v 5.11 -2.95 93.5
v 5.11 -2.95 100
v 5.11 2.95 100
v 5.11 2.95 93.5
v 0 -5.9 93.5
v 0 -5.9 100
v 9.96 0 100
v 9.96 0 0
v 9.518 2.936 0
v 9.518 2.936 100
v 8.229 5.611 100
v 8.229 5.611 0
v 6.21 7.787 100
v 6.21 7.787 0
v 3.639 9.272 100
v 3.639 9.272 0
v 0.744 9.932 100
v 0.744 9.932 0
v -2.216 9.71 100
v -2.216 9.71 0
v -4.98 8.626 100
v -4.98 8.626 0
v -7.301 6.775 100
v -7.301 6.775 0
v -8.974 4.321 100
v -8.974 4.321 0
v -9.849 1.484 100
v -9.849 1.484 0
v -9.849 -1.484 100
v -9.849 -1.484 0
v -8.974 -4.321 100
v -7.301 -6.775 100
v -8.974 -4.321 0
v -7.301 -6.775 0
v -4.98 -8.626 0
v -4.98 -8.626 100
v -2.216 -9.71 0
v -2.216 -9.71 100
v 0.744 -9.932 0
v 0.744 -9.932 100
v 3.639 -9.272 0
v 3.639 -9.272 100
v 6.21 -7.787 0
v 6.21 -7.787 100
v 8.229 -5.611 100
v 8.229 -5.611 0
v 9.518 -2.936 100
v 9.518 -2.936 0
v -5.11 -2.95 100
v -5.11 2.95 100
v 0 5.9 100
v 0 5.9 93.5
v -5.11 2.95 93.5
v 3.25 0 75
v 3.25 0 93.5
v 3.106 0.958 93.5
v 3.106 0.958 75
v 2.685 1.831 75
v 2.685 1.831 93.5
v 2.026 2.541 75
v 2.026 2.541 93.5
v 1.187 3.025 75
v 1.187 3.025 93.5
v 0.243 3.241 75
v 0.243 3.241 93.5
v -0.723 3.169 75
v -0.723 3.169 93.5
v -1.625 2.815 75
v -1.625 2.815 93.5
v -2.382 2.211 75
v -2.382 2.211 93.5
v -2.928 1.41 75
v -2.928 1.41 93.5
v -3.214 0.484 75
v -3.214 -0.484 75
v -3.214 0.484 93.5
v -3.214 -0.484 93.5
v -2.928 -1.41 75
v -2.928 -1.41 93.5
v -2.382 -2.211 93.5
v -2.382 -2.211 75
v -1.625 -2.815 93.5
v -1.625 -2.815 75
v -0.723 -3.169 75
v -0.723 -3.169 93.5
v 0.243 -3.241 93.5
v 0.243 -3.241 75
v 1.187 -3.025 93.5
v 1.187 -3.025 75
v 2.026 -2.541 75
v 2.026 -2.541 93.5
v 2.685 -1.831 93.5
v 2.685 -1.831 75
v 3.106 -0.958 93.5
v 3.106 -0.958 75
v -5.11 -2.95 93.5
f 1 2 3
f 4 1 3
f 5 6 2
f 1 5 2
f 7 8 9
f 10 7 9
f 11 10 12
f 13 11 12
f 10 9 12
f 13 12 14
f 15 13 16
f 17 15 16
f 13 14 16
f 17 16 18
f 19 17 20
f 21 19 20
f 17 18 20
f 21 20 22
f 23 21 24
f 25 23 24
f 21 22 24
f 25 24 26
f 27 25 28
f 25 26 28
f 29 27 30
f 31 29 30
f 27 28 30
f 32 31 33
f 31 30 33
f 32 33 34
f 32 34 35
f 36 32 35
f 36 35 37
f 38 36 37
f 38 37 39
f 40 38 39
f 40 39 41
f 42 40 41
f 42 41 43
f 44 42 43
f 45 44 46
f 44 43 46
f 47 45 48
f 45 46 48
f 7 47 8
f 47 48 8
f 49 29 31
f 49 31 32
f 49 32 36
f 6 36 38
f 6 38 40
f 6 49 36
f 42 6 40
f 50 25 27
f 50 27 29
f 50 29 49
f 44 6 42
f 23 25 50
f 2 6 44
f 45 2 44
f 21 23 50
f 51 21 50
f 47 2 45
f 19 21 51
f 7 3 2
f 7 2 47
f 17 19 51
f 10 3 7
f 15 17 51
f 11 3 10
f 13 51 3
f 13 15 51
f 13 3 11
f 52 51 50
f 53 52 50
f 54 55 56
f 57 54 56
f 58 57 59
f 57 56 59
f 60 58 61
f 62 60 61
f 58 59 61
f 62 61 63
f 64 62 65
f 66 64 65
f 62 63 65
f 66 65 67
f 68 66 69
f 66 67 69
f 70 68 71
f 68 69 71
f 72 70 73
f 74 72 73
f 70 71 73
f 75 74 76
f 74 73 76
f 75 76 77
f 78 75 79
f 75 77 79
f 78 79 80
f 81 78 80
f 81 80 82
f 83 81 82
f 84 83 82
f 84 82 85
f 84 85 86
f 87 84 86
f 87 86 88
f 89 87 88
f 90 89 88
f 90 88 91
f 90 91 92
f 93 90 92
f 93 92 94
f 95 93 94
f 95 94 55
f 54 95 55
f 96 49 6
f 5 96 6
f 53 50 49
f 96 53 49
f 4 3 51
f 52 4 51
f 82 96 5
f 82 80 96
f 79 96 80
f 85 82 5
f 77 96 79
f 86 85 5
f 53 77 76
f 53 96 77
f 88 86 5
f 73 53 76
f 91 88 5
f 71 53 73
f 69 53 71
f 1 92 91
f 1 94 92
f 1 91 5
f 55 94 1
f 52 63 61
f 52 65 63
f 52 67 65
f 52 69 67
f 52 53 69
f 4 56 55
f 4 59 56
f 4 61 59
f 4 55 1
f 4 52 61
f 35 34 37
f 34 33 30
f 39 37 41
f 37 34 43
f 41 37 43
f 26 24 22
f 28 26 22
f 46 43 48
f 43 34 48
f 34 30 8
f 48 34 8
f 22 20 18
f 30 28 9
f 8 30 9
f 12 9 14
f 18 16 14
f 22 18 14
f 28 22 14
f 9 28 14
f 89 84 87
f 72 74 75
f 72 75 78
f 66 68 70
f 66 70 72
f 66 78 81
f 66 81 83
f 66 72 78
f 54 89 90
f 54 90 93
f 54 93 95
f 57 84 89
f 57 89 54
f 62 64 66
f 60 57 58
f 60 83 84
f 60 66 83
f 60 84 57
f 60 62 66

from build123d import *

# Parameters (mm, degrees)
F0_R     = 9.96
F1_DEPTH = 100
F2_R     = 3.25
F3_DEPTH = 25
F5_DEPTH = 6.5


with BuildPart() as f1:
    # F0 (on Top) → F1 (new body)
    with BuildSketch(Plane.XY):
        Circle(F0_R)
    extrude(amount=F1_DEPTH)

    # F2 (on face) → F3 (cut)
    with BuildSketch(Plane.XY.offset(100)):
        Circle(F2_R)
    extrude(amount=-F3_DEPTH, mode=Mode.SUBTRACT)

    # F4 (on face) → F5 (cut)
    with BuildSketch(Plane.XY.offset(100)):
        Polygon((5.10955, 2.95), (0, 5.9), (-5.10955, 2.95), (-5.10955, -2.95), (0, -5.9), (5.10955, -2.95), align=None)
    extrude(amount=-F5_DEPTH, mode=Mode.SUBTRACT)


solid = f1.part
